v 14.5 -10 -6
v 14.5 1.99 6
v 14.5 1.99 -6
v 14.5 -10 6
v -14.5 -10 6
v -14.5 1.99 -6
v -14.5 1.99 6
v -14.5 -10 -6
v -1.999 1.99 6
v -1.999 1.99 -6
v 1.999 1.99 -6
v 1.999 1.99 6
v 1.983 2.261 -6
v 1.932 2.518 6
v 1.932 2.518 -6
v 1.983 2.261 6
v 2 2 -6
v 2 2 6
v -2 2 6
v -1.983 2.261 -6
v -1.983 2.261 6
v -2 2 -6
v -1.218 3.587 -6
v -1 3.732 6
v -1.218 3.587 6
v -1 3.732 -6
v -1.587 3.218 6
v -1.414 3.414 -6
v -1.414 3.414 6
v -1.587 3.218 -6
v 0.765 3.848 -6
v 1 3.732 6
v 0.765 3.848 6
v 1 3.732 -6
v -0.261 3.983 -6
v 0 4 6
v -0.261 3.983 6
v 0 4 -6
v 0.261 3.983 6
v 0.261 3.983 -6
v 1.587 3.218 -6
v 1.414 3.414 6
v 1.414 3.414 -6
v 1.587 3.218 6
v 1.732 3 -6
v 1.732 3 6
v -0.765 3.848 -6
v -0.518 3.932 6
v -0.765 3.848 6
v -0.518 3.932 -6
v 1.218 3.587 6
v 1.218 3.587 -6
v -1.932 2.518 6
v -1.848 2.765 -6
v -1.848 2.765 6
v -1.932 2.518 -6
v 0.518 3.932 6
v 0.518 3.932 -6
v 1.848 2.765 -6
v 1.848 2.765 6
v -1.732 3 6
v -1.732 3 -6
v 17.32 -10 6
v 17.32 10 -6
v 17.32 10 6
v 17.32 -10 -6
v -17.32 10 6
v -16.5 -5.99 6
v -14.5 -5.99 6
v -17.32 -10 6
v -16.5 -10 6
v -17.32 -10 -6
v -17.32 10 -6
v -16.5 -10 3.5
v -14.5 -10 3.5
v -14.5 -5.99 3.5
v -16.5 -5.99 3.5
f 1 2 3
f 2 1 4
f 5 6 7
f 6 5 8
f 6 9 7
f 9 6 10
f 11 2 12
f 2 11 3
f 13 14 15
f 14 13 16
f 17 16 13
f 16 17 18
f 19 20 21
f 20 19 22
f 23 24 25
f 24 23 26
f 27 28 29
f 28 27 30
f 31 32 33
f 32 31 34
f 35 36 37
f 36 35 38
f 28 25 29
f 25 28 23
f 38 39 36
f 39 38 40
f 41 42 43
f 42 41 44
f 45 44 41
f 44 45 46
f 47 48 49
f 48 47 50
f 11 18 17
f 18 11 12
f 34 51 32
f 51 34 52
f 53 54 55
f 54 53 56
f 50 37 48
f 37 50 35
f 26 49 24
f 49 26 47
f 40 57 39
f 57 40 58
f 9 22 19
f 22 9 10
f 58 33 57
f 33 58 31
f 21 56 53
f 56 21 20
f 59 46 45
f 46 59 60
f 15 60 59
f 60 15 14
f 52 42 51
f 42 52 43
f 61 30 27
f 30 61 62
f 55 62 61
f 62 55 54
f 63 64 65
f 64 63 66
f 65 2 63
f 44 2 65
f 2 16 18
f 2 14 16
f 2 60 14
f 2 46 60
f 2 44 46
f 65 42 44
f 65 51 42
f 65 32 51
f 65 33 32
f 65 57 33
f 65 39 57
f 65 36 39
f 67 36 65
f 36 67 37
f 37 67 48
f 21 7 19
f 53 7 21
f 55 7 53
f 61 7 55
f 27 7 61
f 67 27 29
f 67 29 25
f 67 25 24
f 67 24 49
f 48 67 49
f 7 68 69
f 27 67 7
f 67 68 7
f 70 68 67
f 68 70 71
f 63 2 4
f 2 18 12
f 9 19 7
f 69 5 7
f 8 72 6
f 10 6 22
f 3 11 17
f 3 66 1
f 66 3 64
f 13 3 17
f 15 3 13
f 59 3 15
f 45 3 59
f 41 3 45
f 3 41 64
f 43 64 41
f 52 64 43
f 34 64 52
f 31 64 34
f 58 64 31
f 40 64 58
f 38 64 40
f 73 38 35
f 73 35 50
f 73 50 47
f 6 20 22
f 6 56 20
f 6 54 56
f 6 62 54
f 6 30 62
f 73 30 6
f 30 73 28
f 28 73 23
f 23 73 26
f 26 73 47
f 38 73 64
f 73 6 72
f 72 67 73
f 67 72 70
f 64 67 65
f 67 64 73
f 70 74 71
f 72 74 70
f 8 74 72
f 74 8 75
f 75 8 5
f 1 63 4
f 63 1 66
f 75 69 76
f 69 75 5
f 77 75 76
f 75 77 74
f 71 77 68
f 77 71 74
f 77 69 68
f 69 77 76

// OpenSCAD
// Parametric hotbed foot with OpenSCAD Customizer controls.
// Self-contained: this file does not import or reference the source STL.
// v3 replaces the raw mesh with editable dimensions and dropdown-based options.

/* [Foot body] */
// Overall left-to-right size of the box-shaped foot.
foot_length = 34.64; // [20:0.1:80]
// Overall front-to-back size of the box-shaped foot.
foot_width = 20.00; // [10:0.1:60]
// Overall bottom-to-top size of the box-shaped foot.
foot_height = 12.00; // [4:0.1:40]

/* [Large notch opening] */
// Large front opening width.
opening_width = 29.00; // [4:0.1:40]
// How far the large opening cuts into the foot from the front.
opening_depth = 14.00; // [2:0.1:50]
// Corner style for the rear of the large opening.
opening_back = "Rounded"; // [Rounded, Square]
// Radius used when the large opening has a rounded rear.
opening_radius = 2.00; // [0.1:0.1:10]

/* [Top wall notch] */
// Side of the large opening that gets the small notch at the top of the wall.
top_notch_side = "Left"; // [Left, Right, None]
// Left/right size of the small top wall notch.
top_notch_width = 2.00; // [0.5:0.1:10]
// Front/back size of the small top wall notch.
top_notch_depth = 4.00; // [0.5:0.1:15]
// How far down the small top notch cuts from the top surface.
top_notch_height = 2.50; // [0.5:0.1:10]

/* [Placement] */
// Default is centered so the model is visible immediately when opened.
model_position = "Centered"; // [Centered, Source STL]

module rounded_rear_opening(width, depth, height, radius) {
  union() {
    translate([-width / 2, -0.01, -0.01])
      cube([width, max(depth - radius, 0.01), height + 0.02]);

    translate([0, depth - radius, -0.01])
      cylinder(h = height + 0.02, r = min(radius, width / 2), $fn = 48);
  }
}

module large_notch_opening(width, depth, height, radius, back_style) {
  if (back_style == "Rounded") {
    rounded_rear_opening(width, depth, height, radius);
  } else {
    translate([-width / 2, -0.01, -0.01])
      cube([width, depth + 0.02, height + 0.02]);
  }
}

module top_wall_notch(side, opening_width_value, notch_width, notch_depth, notch_height, foot_height_value) {
  if (side != "None") {
    side_sign = side == "Left" ? -1 : 1;
    x_inner_edge = side_sign * opening_width_value / 2;
    x_start = side == "Left" ? x_inner_edge - notch_width : x_inner_edge;

    translate([x_start, -0.01, foot_height_value - notch_height])
      cube([notch_width, notch_depth + 0.02, notch_height + 0.02]);
  }
}

module hotbed_foot_v3(
  length = foot_length,
  width = foot_width,
  height = foot_height,
  opening_w = opening_width,
  opening_d = opening_depth,
  opening_r = opening_radius,
  opening_style = opening_back,
  notch_side = top_notch_side,
  notch_w = top_notch_width,
  notch_d = top_notch_depth,
  notch_h = top_notch_height,
  position = model_position
) {
  source_center = [149.8822937, 138.25900269, 6];
  placement = position == "Source STL" ? source_center : [0, 0, 0];

  translate(placement)
    translate([-length / 2, -width / 2, -height / 2])
      difference() {
        cube([length, width, height]);

        translate([length / 2, 0, 0])
          large_notch_opening(
            min(opening_w, length - 0.2),
            min(opening_d, width + 0.02),
            height,
            opening_r,
            opening_style
          );

        translate([length / 2, 0, 0])
          top_wall_notch(
            notch_side,
            min(opening_w, length - 0.2),
            notch_w,
            notch_d,
            min(notch_h, height),
            height
          );
      }
}

hotbed_foot_v3();
